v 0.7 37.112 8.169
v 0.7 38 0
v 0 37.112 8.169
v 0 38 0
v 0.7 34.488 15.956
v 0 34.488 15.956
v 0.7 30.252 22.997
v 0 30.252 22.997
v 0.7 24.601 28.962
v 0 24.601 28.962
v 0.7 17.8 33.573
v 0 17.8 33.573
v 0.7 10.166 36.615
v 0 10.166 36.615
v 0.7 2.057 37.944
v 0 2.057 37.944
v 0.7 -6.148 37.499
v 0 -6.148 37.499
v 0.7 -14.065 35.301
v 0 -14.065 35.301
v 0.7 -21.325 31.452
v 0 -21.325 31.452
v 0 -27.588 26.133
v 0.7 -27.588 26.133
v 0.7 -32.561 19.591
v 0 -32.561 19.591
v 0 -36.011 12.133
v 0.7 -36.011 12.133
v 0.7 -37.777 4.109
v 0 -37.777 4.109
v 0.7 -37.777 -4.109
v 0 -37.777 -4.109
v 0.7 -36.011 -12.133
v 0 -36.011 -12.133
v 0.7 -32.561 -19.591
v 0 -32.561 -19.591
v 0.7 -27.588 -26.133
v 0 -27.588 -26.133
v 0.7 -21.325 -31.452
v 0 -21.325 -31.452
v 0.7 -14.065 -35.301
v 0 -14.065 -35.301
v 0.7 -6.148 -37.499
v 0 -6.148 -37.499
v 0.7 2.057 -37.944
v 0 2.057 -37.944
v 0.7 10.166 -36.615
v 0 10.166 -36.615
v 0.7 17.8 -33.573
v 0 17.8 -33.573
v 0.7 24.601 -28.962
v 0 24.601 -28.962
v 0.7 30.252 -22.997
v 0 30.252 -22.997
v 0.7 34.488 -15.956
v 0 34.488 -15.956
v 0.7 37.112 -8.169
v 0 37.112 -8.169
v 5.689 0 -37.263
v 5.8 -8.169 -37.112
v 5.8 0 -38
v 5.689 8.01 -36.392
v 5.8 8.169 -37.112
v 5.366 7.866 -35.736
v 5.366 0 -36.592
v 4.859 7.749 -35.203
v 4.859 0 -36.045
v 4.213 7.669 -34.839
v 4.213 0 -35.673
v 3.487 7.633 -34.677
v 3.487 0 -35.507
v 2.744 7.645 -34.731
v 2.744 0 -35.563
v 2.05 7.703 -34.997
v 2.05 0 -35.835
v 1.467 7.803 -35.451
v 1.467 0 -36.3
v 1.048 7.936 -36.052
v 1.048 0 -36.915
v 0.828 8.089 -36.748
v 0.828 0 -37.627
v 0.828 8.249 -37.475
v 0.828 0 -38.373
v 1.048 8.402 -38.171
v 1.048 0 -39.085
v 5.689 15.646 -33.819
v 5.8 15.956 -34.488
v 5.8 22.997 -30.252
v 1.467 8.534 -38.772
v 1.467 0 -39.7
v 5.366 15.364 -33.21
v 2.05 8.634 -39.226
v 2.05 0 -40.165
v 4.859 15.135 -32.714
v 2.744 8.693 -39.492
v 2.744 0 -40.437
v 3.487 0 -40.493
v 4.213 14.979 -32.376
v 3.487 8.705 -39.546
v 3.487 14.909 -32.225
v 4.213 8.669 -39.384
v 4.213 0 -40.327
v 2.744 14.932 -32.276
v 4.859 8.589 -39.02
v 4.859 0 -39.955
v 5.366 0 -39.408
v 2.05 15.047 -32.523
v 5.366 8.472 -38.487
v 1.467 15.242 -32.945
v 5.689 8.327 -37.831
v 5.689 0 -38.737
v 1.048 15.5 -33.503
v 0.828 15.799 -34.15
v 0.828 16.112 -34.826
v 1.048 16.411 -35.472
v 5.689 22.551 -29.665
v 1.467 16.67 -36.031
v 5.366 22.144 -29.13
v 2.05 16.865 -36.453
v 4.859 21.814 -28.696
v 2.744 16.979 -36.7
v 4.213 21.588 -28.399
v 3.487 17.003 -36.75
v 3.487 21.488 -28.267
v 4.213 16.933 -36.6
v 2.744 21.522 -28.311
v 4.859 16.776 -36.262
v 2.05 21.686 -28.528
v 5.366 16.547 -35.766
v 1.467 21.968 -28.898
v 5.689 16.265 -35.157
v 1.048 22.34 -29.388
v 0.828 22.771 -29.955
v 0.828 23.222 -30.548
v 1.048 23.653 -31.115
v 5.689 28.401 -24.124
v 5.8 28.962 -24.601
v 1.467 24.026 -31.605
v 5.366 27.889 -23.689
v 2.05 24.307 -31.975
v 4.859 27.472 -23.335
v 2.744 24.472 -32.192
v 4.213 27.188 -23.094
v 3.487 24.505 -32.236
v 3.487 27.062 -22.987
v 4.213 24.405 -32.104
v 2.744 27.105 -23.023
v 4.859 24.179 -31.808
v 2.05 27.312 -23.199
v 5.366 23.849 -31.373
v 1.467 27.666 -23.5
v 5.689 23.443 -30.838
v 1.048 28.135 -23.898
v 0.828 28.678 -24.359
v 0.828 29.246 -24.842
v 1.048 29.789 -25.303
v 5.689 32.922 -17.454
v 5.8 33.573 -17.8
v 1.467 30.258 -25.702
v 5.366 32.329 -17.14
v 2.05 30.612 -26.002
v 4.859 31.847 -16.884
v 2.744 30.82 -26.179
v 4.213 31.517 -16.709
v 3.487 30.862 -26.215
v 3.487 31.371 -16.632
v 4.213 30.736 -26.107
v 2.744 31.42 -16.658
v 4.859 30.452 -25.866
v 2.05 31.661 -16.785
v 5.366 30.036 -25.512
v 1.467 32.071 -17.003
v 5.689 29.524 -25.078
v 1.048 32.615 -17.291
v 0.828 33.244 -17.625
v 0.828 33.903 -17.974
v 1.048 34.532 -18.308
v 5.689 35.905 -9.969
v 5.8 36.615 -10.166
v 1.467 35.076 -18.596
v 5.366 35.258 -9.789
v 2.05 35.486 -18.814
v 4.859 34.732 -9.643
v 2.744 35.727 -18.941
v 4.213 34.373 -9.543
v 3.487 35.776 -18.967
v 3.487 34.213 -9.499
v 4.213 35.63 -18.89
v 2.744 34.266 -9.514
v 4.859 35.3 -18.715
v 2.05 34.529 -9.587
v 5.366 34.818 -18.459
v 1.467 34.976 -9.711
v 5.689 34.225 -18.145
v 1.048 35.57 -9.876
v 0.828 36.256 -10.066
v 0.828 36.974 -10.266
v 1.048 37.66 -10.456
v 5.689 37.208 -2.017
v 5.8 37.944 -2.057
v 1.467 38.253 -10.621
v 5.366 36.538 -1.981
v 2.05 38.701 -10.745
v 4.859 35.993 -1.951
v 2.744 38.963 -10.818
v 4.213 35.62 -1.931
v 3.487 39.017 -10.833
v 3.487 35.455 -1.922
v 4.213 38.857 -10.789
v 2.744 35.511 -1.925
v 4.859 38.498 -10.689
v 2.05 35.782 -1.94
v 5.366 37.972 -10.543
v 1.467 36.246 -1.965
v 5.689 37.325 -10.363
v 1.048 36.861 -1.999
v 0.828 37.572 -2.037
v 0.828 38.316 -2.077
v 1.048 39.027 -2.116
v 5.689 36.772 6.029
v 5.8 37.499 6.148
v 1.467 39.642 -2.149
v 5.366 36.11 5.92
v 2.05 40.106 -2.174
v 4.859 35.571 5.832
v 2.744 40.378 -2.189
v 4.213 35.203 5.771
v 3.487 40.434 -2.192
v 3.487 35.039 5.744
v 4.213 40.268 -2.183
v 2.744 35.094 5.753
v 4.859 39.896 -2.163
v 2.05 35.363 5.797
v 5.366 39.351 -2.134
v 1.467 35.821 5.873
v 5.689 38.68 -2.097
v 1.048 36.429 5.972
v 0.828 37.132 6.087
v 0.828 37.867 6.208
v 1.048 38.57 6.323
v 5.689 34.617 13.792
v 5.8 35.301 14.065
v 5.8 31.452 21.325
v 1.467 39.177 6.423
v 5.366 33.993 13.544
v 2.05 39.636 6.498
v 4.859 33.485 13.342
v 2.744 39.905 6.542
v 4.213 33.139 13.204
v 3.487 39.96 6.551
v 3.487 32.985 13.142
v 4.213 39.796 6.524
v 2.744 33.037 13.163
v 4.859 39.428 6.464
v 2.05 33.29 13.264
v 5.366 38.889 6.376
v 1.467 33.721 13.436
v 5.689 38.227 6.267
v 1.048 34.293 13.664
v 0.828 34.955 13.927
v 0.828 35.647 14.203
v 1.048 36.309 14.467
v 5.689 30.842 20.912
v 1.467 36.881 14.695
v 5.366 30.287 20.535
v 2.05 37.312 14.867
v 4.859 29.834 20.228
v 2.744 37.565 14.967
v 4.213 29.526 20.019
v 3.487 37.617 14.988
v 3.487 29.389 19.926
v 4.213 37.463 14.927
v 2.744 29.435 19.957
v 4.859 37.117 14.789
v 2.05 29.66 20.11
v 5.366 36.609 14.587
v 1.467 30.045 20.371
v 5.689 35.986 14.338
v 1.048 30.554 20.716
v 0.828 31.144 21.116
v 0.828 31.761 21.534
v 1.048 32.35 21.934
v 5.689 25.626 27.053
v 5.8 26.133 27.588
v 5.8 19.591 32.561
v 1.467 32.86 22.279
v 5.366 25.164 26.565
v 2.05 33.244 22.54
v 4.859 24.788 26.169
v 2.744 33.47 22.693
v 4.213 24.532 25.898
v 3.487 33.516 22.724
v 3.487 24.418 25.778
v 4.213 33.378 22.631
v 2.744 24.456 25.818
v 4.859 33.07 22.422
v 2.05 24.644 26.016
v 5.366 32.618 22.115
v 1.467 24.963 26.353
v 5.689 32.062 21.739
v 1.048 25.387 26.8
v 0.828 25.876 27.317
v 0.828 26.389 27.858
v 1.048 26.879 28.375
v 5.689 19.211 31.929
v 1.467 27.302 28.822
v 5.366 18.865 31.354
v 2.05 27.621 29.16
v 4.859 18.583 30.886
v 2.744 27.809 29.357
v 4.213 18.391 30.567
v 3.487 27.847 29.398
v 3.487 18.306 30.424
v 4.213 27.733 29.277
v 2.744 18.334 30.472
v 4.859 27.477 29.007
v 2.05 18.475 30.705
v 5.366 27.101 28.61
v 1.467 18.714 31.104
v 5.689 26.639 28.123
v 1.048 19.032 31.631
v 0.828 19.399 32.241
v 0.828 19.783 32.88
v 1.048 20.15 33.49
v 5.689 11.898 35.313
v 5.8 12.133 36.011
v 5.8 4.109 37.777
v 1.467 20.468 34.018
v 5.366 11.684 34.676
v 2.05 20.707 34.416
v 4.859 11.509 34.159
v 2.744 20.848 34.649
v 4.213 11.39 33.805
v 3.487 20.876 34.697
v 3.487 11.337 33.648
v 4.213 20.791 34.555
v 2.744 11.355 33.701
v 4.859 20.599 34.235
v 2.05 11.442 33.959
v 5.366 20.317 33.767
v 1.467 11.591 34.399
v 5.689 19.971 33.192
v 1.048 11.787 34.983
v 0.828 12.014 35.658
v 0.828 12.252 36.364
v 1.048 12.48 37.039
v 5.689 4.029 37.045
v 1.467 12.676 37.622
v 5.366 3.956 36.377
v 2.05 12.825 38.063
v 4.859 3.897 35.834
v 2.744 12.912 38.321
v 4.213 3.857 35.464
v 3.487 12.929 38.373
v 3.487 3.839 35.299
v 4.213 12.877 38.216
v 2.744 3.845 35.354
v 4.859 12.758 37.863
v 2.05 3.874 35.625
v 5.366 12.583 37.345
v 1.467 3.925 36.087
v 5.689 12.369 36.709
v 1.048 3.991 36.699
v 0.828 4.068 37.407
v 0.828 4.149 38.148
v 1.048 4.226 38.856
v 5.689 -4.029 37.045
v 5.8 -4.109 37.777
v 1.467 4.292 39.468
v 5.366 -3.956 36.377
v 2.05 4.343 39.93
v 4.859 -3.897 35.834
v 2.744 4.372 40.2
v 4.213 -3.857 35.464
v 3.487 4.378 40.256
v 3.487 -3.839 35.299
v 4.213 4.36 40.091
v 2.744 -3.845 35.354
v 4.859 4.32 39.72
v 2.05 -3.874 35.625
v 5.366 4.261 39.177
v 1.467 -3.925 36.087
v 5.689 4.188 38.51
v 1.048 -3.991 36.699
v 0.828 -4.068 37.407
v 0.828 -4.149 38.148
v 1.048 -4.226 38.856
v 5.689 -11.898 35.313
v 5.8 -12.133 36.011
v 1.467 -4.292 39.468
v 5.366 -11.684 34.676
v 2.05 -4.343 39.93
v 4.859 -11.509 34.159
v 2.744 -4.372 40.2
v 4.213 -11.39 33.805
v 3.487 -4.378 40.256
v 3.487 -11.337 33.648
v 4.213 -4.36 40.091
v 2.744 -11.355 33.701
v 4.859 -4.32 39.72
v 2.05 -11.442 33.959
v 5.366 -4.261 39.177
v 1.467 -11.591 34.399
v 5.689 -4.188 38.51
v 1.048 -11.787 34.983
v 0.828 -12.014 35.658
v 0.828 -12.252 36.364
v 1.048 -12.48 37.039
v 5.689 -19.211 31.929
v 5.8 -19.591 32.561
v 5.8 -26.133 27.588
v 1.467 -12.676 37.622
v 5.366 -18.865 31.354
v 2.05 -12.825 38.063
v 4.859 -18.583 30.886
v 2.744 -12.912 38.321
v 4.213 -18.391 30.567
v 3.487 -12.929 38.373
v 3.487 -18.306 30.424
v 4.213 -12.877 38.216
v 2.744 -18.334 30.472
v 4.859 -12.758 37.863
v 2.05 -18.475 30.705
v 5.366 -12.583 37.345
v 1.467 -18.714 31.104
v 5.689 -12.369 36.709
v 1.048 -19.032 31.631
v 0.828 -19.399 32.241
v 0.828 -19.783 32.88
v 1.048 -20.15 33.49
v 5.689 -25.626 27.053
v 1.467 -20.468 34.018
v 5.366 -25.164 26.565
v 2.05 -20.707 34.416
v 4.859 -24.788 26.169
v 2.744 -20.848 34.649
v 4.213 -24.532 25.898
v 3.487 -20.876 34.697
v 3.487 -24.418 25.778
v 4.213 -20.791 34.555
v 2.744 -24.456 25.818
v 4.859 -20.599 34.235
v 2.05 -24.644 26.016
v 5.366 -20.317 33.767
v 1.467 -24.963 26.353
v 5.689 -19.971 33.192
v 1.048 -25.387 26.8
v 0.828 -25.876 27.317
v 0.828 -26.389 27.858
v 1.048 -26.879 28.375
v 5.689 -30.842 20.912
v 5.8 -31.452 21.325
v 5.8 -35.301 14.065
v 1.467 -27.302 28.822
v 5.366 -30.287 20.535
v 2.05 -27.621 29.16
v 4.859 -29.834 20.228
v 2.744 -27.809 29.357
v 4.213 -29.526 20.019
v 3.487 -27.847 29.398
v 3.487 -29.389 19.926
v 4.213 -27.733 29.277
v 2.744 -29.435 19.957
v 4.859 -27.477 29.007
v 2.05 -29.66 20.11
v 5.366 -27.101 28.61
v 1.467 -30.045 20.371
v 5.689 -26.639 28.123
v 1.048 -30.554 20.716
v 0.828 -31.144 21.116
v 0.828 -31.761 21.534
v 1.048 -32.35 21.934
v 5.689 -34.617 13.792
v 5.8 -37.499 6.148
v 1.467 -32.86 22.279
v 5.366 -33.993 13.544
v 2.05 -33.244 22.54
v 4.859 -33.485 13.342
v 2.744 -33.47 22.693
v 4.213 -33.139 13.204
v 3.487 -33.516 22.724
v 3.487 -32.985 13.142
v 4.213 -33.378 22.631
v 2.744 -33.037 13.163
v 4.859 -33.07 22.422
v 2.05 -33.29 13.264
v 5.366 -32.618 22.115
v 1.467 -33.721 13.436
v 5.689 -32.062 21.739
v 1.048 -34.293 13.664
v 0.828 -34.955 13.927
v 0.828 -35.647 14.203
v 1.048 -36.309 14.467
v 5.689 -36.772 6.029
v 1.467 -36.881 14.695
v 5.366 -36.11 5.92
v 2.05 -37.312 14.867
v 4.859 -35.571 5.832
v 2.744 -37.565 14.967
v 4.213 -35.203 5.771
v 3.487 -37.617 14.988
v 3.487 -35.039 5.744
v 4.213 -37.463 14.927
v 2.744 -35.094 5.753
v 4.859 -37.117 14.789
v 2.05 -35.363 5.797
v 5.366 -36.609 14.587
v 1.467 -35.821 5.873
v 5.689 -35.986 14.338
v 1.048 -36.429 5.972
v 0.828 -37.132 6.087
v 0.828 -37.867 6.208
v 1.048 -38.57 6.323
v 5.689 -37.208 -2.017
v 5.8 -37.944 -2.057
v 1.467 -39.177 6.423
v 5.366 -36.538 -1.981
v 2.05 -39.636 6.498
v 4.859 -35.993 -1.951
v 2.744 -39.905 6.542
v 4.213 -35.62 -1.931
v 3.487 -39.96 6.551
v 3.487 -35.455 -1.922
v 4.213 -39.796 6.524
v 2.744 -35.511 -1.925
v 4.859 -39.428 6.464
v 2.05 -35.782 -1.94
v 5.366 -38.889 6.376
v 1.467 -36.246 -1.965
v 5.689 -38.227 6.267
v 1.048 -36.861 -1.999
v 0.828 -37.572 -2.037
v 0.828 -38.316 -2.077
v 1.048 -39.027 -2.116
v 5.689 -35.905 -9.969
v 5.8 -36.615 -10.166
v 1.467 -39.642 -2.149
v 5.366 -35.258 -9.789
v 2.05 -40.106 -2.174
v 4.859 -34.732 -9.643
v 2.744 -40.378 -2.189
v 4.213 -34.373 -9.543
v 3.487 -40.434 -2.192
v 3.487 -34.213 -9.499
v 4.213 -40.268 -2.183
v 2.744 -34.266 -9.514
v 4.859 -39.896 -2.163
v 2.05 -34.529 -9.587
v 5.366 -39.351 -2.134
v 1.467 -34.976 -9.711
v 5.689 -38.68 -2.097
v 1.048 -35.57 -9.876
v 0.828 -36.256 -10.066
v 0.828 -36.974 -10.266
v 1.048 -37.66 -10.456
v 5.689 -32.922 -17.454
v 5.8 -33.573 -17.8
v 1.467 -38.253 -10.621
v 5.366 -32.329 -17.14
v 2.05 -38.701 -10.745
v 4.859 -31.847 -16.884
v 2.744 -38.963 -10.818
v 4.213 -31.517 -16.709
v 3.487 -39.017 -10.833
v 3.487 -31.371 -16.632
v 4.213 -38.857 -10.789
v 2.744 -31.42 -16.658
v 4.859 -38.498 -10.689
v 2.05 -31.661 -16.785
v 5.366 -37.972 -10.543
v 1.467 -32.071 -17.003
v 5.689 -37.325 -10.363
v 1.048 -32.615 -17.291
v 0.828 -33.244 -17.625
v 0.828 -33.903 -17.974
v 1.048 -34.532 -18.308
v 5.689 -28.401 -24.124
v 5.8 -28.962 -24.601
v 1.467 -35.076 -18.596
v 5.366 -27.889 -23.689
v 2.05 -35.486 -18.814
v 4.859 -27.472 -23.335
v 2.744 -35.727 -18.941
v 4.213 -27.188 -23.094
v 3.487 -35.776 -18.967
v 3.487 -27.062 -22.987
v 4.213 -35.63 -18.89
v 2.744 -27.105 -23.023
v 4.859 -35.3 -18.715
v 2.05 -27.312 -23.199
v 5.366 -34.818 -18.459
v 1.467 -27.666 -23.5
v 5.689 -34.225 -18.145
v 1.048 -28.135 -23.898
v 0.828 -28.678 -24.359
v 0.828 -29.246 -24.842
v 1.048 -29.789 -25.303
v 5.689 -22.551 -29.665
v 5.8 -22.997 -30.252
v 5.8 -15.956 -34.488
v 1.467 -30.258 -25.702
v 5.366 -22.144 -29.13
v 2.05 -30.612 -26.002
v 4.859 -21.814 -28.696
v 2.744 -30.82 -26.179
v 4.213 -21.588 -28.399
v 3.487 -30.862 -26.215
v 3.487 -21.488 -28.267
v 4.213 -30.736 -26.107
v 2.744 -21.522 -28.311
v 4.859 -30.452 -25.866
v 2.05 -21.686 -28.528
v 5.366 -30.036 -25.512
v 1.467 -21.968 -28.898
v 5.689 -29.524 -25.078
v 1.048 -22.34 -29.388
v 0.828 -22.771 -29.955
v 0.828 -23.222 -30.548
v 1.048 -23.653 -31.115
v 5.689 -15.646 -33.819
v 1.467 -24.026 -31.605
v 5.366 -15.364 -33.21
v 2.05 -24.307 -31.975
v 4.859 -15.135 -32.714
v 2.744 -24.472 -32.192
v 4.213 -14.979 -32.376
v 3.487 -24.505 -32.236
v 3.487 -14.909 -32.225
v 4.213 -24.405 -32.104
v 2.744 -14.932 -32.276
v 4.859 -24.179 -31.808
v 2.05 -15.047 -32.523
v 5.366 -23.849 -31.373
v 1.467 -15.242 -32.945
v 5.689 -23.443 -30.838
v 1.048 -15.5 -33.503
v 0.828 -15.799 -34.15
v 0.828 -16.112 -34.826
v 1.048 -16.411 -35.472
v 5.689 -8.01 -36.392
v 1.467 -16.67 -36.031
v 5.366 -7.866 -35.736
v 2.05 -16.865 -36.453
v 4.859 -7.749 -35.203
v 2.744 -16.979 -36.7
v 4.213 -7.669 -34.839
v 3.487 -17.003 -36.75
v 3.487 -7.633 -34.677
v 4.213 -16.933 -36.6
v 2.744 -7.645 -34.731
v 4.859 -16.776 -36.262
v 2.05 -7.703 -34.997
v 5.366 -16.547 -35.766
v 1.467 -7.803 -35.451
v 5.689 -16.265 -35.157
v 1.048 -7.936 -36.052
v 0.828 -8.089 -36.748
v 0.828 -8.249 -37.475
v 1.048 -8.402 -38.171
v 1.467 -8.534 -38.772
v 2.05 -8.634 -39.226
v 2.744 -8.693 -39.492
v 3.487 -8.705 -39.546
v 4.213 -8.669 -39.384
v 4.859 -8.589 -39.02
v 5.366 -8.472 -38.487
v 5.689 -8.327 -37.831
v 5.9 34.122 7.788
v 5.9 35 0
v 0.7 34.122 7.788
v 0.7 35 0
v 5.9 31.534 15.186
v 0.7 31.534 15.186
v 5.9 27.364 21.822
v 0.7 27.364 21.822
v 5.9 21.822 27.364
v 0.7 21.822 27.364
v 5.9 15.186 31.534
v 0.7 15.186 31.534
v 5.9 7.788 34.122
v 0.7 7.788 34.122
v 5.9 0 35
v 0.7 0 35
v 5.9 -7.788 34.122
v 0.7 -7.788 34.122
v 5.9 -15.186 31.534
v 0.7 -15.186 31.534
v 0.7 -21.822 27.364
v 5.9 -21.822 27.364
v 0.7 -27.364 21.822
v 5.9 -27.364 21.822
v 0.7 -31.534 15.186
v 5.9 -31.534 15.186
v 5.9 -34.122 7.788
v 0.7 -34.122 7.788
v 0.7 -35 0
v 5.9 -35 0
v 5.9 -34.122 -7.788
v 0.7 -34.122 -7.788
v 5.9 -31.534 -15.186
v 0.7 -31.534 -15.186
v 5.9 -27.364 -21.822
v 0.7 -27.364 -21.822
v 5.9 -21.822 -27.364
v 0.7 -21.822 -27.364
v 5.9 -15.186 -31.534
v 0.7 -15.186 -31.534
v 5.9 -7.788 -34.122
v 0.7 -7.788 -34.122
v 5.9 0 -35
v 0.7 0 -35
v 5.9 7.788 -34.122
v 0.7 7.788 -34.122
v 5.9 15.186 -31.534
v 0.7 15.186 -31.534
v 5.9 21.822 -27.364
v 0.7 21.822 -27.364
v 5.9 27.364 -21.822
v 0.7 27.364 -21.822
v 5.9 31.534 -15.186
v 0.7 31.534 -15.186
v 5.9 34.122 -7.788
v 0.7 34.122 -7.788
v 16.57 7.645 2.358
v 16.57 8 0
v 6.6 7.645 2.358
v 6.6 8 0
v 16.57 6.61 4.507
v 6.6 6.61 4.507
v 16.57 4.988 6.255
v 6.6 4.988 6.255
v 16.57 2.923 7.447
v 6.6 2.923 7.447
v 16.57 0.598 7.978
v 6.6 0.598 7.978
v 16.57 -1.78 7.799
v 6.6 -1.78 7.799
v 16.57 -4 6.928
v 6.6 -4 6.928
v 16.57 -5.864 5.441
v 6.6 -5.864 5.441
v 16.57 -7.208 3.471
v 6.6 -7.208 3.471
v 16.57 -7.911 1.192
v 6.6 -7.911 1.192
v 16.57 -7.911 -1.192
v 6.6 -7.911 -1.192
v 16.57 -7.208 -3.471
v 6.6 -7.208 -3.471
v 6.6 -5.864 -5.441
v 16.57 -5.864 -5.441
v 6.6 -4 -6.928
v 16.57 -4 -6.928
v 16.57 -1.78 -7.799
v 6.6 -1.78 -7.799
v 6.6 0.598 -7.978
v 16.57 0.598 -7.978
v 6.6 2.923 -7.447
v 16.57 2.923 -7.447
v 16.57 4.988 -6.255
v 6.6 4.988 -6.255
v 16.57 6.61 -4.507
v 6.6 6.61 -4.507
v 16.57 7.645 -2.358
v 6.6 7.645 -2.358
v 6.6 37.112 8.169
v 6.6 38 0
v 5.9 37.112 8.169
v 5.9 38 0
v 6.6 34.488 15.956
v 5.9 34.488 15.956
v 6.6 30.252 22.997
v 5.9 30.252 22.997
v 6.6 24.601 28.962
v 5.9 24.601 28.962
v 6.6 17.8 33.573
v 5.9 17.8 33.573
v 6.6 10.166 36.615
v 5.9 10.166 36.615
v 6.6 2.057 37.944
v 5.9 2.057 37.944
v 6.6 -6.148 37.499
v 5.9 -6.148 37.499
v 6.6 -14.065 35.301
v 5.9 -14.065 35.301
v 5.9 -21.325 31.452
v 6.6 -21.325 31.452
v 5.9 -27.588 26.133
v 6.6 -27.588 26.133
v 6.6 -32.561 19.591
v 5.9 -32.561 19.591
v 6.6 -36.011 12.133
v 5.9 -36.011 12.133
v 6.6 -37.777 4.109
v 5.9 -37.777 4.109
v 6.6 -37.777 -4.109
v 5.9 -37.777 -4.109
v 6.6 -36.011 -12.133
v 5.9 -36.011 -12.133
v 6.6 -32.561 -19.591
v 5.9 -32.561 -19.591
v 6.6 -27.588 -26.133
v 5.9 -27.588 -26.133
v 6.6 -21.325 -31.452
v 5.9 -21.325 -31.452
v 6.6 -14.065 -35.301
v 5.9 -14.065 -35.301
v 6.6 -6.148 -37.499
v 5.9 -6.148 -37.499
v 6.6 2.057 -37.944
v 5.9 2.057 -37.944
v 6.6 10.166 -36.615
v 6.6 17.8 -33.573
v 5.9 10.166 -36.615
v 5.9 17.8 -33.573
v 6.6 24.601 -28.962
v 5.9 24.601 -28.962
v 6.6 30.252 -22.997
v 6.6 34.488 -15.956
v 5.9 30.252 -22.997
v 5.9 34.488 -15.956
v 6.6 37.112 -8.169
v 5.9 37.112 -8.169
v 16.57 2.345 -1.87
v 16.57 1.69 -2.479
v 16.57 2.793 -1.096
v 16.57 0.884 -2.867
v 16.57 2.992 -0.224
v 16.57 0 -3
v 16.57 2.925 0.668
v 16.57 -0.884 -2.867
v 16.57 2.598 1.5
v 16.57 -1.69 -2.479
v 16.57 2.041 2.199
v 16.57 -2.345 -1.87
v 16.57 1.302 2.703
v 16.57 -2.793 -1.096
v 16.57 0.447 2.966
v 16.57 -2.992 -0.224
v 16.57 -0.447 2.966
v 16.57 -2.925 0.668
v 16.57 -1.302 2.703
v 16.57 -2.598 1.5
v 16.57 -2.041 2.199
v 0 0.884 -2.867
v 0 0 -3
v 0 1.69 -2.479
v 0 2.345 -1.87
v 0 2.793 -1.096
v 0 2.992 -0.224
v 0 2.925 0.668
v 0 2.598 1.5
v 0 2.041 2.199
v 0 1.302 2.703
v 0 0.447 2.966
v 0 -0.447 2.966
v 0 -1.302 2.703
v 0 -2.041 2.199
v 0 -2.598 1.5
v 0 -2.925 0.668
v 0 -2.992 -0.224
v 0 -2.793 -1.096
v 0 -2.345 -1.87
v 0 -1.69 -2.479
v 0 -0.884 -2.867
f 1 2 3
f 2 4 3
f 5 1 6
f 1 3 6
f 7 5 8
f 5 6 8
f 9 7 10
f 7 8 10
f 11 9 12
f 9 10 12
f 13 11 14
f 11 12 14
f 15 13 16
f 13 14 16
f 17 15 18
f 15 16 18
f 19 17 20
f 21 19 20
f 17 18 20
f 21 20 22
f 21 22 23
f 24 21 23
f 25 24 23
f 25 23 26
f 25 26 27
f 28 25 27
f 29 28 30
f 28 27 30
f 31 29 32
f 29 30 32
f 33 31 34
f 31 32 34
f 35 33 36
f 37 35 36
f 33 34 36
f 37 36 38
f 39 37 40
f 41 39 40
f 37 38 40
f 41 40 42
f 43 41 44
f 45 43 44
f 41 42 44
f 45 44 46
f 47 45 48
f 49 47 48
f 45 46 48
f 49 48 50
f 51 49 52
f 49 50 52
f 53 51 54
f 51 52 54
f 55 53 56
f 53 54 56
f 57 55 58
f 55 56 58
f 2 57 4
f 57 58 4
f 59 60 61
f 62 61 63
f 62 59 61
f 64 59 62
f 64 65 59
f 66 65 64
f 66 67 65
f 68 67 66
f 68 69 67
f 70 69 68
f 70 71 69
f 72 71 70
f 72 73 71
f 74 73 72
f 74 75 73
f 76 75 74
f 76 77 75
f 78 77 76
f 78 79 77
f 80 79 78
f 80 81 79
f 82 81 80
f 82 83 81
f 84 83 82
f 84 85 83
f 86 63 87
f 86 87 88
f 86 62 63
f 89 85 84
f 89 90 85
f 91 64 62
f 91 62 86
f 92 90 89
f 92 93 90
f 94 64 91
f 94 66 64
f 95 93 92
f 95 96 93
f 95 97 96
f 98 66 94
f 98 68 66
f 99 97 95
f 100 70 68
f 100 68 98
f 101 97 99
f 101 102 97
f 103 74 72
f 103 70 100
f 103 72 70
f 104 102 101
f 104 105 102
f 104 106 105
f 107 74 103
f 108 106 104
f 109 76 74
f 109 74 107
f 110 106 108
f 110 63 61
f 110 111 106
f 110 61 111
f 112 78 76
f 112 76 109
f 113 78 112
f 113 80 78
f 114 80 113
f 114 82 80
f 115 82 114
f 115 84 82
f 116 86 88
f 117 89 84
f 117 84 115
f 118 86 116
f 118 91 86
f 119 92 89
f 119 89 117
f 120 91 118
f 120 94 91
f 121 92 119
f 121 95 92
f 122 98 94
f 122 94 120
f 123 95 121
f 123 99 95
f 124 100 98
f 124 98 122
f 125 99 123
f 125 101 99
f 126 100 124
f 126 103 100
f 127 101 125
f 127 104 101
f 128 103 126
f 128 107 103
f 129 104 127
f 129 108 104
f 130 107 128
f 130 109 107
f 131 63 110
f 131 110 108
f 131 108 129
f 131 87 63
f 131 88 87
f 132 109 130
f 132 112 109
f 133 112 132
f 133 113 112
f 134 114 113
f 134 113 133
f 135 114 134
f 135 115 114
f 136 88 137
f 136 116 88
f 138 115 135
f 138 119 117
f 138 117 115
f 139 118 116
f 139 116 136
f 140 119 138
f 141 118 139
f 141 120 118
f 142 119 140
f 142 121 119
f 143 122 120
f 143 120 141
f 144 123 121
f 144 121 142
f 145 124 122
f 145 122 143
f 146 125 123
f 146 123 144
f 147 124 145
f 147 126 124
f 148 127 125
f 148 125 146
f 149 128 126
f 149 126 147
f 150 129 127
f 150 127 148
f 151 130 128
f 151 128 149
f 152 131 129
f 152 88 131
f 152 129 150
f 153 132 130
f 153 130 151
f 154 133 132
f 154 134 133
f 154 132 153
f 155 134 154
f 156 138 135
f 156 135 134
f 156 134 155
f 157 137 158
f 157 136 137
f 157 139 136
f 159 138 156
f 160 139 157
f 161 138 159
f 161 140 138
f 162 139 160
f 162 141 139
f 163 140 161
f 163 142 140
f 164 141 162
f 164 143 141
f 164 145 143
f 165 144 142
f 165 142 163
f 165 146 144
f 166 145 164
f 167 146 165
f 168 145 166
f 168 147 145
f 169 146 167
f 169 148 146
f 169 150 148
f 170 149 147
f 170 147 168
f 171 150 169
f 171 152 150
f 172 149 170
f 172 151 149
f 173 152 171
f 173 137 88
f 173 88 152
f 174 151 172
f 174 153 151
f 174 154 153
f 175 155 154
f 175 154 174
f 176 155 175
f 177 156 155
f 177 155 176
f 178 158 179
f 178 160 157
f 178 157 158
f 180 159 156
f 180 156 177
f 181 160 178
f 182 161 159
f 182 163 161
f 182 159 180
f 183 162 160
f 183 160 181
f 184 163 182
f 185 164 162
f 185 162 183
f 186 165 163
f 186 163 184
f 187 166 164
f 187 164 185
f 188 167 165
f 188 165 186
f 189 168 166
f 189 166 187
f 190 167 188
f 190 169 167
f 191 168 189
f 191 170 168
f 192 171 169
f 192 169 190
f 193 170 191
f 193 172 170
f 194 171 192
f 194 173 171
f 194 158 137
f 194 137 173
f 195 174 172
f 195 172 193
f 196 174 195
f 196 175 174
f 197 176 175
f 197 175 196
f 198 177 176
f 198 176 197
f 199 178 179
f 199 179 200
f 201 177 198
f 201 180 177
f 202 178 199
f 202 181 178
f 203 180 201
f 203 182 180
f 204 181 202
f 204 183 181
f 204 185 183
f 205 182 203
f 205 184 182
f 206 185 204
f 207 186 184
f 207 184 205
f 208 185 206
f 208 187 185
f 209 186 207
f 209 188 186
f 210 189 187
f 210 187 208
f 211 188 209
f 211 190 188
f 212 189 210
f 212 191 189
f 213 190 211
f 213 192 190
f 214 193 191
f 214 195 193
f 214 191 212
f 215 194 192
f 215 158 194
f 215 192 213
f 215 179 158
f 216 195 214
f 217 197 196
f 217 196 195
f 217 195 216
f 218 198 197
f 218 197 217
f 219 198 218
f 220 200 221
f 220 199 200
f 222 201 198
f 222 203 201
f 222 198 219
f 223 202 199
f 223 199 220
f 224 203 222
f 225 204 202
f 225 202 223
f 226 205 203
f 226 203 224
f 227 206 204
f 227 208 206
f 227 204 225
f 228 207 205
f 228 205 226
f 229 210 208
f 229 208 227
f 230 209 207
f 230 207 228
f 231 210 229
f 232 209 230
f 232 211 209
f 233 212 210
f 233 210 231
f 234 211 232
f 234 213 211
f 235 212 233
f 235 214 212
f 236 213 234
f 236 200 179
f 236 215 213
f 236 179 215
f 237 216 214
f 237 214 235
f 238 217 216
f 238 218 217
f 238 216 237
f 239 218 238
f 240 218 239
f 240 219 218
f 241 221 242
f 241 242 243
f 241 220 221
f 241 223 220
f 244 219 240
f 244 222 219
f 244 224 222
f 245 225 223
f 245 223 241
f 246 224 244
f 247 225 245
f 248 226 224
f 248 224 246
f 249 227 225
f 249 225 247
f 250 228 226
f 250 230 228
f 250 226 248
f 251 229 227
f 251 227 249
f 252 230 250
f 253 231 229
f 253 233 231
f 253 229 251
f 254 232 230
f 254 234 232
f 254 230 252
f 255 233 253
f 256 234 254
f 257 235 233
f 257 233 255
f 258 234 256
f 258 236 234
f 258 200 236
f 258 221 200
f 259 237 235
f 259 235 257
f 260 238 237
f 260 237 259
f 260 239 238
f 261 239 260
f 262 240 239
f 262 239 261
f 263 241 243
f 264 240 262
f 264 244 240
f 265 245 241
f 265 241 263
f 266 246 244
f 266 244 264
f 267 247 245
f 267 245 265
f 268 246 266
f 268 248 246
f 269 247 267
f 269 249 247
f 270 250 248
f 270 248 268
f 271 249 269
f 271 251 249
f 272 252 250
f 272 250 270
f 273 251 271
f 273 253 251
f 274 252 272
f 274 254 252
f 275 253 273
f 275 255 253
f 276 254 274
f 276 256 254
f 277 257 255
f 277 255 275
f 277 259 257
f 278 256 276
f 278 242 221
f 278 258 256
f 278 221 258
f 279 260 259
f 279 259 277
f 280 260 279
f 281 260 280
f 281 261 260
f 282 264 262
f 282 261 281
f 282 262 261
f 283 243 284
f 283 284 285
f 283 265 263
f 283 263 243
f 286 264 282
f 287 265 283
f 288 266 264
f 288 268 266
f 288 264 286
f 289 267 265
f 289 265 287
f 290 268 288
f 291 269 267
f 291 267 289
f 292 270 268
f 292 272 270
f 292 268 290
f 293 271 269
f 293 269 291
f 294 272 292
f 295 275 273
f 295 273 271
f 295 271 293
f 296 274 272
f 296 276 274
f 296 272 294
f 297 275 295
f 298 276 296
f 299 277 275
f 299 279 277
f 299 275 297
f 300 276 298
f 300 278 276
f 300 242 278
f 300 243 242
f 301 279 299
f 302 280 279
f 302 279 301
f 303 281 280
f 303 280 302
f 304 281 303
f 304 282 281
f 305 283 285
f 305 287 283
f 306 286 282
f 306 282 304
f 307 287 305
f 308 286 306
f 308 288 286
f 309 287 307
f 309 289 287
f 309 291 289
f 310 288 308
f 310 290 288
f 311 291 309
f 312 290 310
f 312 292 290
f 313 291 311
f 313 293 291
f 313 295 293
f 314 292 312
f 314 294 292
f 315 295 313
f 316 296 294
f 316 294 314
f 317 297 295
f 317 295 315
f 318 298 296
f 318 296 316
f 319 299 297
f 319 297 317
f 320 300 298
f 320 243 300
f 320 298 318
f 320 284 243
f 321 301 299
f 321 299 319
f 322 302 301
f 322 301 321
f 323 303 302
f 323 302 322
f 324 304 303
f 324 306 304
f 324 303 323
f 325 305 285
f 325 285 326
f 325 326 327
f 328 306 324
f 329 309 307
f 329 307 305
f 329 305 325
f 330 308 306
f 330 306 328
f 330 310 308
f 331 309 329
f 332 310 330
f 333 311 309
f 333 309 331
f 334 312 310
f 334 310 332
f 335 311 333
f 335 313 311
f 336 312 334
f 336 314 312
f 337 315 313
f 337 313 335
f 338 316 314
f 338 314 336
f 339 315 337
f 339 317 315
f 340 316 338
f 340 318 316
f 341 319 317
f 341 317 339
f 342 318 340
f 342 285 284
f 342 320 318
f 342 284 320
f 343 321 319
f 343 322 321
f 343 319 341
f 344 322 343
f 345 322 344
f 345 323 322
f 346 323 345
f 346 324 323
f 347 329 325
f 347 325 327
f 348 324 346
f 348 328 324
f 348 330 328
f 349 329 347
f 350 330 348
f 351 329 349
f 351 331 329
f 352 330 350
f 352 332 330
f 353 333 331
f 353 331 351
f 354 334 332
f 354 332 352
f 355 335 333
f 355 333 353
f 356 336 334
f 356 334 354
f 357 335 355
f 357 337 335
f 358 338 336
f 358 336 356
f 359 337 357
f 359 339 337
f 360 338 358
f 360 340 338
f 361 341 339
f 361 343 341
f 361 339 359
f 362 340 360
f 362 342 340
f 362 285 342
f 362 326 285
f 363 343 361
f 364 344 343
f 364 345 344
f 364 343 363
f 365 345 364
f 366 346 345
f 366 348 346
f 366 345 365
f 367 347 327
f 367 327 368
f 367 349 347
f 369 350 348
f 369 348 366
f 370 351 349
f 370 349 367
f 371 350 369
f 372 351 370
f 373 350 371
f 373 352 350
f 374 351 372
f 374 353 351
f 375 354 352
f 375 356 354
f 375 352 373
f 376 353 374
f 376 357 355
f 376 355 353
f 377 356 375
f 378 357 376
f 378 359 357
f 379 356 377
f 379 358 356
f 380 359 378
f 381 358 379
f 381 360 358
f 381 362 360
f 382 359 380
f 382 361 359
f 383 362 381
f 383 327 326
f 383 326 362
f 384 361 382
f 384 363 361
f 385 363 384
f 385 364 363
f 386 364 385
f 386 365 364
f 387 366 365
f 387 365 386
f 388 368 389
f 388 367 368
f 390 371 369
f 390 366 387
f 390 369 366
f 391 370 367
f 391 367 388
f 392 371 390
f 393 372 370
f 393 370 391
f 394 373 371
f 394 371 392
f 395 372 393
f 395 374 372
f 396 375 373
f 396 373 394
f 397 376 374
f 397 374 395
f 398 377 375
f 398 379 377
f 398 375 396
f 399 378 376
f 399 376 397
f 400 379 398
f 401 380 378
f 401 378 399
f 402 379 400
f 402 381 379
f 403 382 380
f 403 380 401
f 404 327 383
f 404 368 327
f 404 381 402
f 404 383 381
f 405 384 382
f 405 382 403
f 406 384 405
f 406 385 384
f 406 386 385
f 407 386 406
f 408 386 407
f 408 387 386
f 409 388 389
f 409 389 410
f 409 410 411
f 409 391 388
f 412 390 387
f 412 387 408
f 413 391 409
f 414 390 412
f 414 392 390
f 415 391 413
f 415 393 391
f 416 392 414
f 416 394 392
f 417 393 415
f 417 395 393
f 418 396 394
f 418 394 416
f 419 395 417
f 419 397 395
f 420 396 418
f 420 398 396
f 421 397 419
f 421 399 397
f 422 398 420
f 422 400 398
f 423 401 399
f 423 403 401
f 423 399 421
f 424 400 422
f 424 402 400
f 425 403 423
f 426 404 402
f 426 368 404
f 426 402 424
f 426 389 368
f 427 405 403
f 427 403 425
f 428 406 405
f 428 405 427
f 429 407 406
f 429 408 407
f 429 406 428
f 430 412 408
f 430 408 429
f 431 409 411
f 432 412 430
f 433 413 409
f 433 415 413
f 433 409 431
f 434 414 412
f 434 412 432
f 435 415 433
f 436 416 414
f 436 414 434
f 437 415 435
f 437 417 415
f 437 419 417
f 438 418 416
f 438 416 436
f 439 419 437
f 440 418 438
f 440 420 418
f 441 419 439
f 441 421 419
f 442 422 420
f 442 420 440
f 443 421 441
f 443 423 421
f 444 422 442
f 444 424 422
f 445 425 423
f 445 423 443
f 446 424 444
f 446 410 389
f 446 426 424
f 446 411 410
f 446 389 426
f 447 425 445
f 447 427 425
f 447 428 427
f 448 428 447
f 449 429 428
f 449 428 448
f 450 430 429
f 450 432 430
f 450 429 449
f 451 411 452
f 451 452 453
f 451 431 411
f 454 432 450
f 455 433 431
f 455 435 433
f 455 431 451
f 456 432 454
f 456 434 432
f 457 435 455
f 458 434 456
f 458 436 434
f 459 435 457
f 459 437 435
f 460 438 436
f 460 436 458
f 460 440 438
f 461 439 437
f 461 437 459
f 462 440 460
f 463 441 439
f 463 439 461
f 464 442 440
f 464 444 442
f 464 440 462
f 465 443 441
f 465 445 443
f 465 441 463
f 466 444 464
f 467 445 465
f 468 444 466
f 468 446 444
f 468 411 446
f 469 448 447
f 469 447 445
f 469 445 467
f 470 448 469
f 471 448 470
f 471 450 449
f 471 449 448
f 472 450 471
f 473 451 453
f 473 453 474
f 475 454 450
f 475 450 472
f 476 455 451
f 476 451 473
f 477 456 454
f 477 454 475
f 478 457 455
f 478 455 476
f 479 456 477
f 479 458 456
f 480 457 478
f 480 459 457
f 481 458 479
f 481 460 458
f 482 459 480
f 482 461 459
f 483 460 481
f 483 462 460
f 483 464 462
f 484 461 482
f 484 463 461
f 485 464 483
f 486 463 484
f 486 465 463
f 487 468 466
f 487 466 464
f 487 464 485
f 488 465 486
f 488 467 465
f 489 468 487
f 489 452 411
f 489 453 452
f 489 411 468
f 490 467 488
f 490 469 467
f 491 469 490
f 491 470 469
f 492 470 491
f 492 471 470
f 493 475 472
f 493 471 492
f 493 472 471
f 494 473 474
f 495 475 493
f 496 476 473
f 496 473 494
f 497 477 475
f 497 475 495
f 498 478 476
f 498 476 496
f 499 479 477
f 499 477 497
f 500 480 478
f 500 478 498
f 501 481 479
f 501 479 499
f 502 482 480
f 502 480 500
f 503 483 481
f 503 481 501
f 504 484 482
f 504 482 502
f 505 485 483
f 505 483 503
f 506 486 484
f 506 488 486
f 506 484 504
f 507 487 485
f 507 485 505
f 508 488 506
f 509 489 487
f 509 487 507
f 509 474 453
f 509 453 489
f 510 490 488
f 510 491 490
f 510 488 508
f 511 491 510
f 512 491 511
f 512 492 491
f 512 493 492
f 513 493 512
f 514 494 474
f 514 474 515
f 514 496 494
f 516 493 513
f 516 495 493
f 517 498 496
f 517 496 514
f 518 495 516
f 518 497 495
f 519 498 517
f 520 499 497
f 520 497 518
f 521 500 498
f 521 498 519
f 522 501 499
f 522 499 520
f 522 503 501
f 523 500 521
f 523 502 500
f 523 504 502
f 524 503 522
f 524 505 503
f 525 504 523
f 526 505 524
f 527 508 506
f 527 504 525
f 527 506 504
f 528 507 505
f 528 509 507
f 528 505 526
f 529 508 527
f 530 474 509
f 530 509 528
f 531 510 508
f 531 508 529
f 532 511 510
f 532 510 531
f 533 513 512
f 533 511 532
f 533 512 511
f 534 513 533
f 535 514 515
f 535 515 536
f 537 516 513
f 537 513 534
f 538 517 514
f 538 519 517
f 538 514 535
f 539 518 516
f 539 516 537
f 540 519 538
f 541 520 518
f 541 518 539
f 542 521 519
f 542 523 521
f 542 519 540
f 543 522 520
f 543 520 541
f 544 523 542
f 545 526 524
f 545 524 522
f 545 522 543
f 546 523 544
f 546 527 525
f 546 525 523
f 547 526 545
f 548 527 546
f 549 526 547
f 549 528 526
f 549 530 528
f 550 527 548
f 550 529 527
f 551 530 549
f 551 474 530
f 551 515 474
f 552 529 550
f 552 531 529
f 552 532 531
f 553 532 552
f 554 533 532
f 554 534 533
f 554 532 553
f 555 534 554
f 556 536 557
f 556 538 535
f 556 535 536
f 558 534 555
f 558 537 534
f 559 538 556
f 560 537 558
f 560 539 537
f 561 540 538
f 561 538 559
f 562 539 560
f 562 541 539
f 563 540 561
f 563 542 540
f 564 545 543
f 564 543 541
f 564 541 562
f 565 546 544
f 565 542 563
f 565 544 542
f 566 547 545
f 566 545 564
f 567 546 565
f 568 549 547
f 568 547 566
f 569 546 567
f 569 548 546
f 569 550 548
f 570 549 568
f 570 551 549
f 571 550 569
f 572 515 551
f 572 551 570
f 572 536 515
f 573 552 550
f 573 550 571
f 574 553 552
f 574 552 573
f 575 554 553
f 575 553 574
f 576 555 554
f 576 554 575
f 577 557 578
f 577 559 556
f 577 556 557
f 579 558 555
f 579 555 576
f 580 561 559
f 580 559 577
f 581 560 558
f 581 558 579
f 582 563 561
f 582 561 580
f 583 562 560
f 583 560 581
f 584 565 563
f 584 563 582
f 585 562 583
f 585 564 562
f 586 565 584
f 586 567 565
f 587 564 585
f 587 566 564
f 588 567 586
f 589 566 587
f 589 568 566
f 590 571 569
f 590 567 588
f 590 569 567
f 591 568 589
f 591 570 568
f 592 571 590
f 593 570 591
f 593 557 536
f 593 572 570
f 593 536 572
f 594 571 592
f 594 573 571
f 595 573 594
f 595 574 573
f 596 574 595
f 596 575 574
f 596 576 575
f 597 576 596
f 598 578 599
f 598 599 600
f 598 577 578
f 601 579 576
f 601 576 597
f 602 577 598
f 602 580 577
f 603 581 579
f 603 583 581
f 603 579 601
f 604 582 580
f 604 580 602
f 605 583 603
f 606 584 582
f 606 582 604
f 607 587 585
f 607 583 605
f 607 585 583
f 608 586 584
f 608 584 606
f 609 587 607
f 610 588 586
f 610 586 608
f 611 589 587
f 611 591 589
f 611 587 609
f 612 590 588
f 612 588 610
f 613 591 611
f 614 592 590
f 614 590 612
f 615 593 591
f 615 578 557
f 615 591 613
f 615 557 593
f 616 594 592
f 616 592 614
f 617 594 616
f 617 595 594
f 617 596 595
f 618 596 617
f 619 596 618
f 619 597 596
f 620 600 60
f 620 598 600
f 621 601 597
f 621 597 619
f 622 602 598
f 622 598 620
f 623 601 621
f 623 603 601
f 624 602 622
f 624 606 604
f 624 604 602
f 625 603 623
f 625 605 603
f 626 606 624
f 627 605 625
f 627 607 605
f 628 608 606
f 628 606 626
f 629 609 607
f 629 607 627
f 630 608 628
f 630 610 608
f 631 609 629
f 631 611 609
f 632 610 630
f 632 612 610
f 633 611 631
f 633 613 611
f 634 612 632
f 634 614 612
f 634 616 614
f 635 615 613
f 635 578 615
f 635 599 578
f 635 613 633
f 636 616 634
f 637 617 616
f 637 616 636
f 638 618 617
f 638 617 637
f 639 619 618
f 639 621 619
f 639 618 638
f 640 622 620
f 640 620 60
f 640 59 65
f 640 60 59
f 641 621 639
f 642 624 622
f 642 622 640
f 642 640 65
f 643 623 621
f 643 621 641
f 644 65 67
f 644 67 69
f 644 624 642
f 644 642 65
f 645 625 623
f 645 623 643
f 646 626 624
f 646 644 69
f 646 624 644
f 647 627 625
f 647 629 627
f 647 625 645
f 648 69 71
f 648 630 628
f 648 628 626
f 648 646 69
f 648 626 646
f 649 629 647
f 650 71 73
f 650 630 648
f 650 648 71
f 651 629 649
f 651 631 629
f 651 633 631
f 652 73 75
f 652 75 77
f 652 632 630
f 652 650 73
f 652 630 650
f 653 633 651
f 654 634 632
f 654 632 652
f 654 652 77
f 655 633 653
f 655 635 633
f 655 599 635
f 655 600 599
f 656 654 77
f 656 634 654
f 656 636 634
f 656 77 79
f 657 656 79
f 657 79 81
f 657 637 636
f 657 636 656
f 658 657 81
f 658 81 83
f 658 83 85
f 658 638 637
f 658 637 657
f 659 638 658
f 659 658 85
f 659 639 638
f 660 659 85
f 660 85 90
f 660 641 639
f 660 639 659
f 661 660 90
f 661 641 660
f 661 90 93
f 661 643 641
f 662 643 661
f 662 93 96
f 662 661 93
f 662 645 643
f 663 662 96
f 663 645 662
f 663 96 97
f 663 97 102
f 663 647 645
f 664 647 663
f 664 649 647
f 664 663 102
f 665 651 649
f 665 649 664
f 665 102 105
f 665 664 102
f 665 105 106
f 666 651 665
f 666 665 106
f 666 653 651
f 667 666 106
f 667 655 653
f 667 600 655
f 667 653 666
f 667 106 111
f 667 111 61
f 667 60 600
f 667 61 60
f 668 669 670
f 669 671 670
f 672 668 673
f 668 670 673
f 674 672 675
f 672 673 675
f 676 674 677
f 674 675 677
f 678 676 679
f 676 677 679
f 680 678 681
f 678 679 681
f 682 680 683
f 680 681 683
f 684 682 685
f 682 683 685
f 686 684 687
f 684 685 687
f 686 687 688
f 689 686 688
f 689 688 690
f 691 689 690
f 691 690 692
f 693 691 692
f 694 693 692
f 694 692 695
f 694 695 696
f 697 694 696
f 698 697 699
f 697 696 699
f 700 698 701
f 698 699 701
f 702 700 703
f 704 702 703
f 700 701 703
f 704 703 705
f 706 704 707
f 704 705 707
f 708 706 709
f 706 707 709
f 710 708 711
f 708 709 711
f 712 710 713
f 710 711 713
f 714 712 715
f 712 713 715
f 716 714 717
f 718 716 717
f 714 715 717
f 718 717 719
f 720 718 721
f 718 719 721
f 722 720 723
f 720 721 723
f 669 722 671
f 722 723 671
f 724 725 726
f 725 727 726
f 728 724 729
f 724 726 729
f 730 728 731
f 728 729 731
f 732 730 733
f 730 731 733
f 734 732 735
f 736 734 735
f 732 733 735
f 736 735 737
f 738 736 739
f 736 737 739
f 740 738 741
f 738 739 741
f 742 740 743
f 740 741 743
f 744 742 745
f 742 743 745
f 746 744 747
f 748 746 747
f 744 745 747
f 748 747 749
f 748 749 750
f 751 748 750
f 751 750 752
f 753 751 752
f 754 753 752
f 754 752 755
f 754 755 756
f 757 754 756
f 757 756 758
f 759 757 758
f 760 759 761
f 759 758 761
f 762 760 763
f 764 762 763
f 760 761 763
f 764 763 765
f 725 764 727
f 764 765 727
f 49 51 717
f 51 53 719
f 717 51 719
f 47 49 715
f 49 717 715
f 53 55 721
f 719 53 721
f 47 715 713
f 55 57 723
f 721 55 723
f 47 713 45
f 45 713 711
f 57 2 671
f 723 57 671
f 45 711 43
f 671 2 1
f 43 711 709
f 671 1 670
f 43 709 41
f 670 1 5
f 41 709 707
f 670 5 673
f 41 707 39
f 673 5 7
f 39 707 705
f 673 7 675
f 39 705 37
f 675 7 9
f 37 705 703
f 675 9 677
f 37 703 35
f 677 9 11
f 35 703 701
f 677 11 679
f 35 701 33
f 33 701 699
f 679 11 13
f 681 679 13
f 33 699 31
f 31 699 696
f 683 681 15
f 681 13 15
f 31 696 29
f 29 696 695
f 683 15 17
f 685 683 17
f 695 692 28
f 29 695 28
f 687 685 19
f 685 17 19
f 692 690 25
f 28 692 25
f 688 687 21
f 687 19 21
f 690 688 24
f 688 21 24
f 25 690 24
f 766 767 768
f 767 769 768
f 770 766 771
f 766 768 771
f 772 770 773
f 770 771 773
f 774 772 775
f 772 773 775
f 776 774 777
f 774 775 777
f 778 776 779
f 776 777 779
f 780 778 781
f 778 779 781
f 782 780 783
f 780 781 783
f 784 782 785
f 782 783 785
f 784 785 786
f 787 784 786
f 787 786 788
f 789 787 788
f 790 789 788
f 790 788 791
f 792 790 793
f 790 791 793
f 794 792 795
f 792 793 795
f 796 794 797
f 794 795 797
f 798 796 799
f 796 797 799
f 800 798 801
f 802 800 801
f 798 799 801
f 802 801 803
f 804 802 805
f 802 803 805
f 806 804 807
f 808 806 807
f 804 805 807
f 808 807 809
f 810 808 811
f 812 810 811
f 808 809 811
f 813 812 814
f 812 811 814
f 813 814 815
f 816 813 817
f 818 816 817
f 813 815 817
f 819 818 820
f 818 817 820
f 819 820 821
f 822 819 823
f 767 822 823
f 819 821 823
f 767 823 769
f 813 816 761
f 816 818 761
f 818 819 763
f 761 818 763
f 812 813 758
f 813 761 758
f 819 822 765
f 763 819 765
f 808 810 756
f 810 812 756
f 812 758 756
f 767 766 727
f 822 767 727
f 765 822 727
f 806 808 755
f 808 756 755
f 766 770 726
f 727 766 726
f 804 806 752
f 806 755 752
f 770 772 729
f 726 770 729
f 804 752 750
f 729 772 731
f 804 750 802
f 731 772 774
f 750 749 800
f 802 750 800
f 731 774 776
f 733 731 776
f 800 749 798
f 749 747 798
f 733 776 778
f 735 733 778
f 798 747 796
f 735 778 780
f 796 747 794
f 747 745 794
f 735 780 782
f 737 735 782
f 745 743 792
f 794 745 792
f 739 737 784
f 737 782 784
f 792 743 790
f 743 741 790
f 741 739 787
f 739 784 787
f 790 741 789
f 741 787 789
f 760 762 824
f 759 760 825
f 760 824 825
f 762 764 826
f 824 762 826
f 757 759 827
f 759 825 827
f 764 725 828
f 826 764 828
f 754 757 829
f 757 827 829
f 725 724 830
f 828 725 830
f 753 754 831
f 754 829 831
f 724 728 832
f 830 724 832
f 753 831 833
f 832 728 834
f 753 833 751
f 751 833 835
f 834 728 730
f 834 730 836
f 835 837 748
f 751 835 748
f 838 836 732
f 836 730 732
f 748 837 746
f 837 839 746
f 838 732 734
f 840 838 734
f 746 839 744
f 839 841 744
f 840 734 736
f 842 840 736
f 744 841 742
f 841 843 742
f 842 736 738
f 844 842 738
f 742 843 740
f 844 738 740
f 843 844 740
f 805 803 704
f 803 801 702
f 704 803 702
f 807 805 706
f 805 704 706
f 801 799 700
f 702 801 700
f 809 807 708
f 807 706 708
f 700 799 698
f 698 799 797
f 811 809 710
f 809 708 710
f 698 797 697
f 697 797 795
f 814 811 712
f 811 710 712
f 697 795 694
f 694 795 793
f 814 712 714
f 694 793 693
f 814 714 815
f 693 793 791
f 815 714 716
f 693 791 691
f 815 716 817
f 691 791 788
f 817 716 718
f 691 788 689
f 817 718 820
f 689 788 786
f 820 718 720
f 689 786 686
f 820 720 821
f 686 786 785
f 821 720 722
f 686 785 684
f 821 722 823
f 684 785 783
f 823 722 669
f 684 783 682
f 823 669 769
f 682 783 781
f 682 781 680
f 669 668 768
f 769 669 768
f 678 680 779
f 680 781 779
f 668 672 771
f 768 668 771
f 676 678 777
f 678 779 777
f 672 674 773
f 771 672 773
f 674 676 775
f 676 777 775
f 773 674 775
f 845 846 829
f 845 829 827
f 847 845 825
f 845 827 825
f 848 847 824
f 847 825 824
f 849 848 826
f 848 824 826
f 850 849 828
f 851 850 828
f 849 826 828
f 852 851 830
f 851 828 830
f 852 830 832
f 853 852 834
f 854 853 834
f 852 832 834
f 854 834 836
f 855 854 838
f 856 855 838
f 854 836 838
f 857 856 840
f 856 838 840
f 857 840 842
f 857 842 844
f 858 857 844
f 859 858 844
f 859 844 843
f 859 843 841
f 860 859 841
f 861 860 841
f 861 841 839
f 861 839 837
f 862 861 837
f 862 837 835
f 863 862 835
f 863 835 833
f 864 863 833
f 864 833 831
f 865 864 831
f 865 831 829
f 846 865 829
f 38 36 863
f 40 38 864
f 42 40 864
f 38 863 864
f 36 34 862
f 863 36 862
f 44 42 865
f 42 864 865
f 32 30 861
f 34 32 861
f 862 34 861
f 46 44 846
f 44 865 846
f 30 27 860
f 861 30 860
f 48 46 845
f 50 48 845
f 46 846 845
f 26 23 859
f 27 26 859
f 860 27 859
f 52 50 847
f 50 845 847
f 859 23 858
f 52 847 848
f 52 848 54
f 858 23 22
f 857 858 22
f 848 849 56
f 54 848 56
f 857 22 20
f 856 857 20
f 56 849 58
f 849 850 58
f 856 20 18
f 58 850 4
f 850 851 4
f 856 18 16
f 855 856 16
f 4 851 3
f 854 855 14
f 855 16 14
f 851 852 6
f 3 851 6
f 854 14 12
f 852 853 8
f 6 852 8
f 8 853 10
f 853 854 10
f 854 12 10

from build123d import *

# Parameters (mm, degrees)
ESQUISSE2_R             = 3
ENL_V_MAT_EXTRU_1_DEPTH = 17.57
ESQUISSE5_R             = 2.5


with BuildPart() as part:
    # Esquisse1 → Révolution1 (revolve)
    with BuildSketch(Plane.XY):
        Polygon((0, 0), (16.57, 0), (16.57, 8), (6.6, 8), (6.6, 38), (5.9, 38), (5.9, 35), (0.7, 35), (0.7, 38), (0, 38), align=None)
    revolve(axis=Axis((-19.945085304, 0, 0), (1, 0, 0)))

    # Esquisse2 → Enlèv. mat.-Extru.1 (cut, through all)
    with BuildSketch(Plane(origin=(16.57, 0, 0), x_dir=(0, 0, -1), z_dir=(1, 0, 0))):
        Circle(ESQUISSE2_R)
    extrude(amount=-ENL_V_MAT_EXTRU_1_DEPTH, mode=Mode.SUBTRACT)


with BuildPart() as body_2:
    # Balayage1: sweep along a path in Esquisse4
    with BuildLine(Plane(origin=(3.3, 0, 0), x_dir=(0, 0, -1), z_dir=(1, 0, 0))) as balayage1_path:
        CenterArc((0, 0), 38.5, 0, 360)
    # Esquisse5 → Balayage1 (sweep)
    with BuildSketch(Plane.XY):
        with Locations((3.3, 38)):
            Circle(ESQUISSE5_R)
    sweep(path=balayage1_path.line)


solid = Compound([part.part, body_2.part])
